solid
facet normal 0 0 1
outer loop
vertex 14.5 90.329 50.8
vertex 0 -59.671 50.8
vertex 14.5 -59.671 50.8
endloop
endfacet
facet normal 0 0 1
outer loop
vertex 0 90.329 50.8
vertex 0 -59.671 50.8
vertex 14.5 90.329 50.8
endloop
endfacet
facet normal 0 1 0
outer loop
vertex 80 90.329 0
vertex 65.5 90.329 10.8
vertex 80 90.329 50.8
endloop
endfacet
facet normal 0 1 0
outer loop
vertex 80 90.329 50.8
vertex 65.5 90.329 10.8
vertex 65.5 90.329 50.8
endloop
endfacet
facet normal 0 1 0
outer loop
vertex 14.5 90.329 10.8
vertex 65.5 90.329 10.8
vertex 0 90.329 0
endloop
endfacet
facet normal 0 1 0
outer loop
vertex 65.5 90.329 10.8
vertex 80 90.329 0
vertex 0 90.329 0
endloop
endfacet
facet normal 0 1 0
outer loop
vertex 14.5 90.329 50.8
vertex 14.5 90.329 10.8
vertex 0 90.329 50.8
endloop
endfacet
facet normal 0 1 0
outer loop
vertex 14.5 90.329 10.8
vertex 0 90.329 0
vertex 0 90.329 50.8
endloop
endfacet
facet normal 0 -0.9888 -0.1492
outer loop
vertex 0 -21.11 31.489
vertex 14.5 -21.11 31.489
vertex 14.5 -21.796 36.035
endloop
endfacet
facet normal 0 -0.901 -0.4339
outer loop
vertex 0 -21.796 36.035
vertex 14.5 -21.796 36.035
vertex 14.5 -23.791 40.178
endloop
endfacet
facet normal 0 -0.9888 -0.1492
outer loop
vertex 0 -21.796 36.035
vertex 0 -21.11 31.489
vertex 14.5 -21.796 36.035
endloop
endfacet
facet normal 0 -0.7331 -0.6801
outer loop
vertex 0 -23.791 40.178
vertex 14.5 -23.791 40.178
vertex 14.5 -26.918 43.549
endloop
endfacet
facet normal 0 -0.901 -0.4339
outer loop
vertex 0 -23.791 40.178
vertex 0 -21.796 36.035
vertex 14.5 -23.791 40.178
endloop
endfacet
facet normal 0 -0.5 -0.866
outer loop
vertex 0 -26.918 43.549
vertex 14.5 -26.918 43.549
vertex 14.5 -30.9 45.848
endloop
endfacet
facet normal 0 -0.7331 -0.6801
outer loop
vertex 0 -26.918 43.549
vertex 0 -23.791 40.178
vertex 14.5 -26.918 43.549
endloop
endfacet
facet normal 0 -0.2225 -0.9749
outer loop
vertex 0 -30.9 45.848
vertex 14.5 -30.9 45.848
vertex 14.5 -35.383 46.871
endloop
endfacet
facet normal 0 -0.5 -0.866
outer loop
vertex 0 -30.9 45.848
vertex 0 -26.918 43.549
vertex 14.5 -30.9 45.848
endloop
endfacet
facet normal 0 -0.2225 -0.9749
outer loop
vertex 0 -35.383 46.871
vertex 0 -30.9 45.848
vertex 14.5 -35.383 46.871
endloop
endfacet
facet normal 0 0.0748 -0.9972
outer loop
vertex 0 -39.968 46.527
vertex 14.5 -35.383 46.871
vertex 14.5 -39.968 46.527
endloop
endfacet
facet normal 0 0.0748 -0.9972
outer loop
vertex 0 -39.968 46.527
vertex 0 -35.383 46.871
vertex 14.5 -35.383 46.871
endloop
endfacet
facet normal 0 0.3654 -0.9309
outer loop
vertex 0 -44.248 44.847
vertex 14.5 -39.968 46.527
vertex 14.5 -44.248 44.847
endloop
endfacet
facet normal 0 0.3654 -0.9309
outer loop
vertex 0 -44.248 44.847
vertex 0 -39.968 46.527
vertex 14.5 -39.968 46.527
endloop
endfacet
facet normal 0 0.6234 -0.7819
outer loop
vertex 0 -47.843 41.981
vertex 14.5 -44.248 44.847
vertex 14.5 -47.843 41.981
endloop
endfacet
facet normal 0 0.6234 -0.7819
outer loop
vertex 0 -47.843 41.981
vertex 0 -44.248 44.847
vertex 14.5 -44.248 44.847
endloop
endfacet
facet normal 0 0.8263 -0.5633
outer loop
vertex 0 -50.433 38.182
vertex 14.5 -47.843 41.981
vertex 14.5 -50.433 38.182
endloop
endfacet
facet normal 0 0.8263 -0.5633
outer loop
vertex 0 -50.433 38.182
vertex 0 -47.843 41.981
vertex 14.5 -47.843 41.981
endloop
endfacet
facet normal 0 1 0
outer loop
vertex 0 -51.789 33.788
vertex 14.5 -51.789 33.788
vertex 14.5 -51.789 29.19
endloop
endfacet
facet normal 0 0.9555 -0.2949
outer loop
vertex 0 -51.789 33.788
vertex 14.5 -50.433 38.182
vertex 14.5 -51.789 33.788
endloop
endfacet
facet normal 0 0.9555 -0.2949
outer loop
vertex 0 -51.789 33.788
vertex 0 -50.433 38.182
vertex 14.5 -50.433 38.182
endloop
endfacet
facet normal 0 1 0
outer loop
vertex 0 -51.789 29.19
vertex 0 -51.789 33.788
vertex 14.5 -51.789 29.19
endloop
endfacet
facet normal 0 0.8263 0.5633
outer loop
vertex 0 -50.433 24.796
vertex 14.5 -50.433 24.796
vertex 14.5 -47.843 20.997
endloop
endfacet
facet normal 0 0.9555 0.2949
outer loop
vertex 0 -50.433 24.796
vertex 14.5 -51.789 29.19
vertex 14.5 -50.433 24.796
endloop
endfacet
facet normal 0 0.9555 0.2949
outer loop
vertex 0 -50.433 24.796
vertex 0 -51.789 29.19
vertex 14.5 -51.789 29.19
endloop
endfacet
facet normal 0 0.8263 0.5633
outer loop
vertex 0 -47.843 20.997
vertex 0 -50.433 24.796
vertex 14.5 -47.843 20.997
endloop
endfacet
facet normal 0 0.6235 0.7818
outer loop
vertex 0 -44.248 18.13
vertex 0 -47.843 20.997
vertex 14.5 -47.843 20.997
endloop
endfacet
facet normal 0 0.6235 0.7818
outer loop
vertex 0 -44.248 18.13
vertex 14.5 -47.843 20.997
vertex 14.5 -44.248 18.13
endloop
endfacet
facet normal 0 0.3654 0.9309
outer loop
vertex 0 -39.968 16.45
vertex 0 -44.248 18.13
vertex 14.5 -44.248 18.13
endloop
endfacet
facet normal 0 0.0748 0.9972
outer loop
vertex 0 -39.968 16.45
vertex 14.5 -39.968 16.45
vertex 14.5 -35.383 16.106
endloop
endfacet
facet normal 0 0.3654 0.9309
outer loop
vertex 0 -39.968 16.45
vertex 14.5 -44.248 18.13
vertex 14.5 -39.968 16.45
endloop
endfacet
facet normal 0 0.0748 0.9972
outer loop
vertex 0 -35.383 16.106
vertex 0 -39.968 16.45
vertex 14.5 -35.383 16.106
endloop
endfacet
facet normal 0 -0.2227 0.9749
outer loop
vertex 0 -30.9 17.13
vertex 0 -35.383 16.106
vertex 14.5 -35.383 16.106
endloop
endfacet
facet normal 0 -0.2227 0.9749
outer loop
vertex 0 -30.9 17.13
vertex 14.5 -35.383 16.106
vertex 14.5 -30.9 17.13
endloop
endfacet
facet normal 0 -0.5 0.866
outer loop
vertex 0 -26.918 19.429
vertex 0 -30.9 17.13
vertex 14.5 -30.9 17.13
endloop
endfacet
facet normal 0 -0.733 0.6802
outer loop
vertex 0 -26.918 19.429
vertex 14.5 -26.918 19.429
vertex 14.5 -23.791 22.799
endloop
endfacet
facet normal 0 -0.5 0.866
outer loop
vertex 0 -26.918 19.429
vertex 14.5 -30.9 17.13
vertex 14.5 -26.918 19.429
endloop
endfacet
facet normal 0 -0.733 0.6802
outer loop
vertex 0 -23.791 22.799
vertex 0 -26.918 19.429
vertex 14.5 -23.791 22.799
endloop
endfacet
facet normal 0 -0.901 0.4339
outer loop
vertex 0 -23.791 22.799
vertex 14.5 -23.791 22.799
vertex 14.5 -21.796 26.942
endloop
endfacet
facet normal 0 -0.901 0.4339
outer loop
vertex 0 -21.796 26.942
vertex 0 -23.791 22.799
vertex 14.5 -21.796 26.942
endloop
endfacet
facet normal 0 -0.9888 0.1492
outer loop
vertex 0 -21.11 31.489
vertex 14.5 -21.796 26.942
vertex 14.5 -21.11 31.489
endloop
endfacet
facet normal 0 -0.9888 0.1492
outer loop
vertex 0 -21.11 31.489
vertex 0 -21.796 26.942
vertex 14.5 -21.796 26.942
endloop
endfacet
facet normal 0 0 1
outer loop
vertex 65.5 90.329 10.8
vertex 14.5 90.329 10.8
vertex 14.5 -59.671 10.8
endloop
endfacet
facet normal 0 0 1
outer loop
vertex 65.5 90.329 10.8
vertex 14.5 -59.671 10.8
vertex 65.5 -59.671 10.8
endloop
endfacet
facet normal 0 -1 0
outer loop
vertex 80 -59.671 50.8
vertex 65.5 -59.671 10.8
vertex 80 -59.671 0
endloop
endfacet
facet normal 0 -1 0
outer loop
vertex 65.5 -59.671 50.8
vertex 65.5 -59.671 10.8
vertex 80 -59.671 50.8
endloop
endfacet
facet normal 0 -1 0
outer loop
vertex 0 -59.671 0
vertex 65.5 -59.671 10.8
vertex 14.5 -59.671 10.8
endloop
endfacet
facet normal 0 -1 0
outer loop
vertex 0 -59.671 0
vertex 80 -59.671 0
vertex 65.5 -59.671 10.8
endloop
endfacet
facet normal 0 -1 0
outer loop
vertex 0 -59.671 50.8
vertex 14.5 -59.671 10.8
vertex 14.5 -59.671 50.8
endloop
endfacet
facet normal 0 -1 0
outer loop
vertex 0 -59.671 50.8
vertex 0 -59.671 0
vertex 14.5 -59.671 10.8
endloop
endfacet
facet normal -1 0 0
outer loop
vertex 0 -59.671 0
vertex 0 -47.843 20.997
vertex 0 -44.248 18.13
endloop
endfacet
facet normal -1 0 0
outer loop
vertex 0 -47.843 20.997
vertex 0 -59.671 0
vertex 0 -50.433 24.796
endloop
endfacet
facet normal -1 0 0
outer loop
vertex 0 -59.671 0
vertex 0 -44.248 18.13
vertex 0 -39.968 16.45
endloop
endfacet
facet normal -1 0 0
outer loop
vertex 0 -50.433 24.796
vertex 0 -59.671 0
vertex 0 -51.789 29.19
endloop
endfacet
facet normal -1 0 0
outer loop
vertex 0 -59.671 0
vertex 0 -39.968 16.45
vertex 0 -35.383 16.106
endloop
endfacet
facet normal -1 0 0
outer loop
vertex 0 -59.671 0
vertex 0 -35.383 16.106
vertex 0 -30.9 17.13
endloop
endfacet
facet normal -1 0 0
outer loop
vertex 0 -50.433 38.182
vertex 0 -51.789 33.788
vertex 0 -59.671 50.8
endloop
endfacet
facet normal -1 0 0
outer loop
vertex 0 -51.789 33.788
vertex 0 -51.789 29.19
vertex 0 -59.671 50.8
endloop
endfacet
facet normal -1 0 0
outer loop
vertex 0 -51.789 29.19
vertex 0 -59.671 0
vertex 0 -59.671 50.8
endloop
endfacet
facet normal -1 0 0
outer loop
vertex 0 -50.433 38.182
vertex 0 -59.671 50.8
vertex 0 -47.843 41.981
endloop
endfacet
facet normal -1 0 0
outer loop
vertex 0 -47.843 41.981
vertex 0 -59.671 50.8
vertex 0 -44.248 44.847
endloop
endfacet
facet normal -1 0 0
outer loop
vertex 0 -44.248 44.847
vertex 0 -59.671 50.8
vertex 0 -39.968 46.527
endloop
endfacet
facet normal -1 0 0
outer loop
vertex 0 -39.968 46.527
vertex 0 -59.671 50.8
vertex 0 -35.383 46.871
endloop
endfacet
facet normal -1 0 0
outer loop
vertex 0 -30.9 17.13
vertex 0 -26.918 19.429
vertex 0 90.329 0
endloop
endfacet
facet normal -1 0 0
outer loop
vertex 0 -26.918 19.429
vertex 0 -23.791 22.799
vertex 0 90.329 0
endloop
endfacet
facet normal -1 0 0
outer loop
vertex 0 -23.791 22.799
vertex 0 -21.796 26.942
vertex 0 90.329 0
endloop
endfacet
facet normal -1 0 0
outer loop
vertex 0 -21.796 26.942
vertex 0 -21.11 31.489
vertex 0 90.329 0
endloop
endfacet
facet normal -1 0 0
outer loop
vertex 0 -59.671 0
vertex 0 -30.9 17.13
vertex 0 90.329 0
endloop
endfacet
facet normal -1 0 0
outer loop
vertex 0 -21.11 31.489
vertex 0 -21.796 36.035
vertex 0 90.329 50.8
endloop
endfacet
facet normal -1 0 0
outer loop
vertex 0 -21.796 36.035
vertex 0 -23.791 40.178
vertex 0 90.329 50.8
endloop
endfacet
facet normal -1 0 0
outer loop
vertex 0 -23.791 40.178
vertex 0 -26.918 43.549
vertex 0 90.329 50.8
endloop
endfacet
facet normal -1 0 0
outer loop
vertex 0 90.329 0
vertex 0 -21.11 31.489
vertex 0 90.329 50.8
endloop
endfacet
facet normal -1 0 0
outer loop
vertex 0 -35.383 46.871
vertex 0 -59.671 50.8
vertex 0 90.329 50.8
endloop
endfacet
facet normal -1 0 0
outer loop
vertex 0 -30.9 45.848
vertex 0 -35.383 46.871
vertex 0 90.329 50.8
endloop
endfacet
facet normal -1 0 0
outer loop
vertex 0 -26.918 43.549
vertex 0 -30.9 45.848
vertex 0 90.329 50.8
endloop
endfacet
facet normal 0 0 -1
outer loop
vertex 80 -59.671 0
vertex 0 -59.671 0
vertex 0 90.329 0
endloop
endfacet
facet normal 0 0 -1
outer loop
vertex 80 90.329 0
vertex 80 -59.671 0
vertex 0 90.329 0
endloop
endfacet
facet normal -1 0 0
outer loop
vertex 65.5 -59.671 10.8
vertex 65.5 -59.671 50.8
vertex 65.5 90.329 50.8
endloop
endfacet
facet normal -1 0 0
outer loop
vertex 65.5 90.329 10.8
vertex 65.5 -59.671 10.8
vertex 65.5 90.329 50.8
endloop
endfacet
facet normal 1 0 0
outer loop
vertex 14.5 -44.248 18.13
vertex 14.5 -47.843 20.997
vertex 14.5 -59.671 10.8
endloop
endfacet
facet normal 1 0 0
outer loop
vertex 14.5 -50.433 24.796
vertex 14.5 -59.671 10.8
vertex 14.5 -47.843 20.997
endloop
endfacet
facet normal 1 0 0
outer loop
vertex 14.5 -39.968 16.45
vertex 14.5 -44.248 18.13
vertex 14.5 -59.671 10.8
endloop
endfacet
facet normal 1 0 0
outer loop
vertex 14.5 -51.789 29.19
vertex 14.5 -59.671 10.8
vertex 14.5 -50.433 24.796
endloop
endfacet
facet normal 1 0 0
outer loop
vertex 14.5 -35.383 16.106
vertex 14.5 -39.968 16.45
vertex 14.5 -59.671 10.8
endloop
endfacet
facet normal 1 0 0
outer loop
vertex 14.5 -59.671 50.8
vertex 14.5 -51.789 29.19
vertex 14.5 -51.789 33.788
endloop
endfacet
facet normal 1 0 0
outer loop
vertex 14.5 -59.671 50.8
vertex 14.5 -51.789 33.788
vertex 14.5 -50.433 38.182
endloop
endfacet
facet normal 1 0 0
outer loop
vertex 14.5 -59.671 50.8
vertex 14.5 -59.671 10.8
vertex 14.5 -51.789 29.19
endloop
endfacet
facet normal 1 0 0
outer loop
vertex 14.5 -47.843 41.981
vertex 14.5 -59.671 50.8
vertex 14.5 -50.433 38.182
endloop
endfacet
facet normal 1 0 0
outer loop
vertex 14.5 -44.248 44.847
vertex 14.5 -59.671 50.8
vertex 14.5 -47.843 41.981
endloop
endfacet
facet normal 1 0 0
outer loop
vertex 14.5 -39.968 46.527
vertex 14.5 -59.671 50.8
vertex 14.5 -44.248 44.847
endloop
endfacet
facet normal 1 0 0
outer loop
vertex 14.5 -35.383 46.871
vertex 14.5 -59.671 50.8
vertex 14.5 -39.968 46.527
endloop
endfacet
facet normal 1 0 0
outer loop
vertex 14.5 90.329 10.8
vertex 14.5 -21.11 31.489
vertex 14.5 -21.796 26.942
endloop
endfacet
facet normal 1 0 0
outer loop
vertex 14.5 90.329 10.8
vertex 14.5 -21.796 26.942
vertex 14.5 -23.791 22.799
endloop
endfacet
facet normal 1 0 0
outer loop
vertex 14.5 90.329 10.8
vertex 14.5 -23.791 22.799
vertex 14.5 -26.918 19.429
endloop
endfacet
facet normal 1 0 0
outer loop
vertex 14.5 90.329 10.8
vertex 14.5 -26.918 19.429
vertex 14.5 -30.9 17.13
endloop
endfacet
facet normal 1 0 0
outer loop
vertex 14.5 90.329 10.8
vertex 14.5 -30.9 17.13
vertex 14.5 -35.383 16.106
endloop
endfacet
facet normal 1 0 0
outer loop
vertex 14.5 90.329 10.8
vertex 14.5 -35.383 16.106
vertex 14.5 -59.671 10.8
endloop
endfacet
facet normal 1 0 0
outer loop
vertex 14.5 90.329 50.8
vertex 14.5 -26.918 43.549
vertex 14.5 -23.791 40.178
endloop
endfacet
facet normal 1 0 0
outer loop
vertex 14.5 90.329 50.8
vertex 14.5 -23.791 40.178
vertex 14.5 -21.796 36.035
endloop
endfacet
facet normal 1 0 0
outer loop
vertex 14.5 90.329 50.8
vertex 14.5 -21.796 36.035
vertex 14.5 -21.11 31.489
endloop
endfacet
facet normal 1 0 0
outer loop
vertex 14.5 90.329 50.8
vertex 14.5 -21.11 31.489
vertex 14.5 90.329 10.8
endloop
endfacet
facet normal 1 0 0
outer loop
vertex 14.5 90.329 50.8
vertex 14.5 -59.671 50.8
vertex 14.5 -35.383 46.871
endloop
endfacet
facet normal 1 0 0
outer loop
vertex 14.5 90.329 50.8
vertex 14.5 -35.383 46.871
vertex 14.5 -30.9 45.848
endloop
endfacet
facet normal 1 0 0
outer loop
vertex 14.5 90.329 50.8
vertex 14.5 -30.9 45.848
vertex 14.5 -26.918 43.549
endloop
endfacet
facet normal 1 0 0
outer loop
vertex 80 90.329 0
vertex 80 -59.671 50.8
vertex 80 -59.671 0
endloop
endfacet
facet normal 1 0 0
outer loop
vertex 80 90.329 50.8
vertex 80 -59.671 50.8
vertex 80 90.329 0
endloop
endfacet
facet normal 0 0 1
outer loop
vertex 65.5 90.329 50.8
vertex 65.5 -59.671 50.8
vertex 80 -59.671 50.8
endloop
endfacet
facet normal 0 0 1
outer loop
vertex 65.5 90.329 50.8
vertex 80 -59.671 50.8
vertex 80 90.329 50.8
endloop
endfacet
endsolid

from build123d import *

# Parameters (mm, degrees)
F0_W     = 150
F0_H     = 50.8
F1_DEPTH = 80
F2_W     = 51
F2_H     = 150
F3_DEPTH = 40
F4_R     = 15.425374
F5_DEPTH = 25.4


with BuildPart() as f1:
    # F0 (on Right) → F1 (new body)
    with BuildSketch(Plane.YZ):
        with Locations((15.329447, 25.4)):
            Rectangle(F0_W, F0_H)
    extrude(amount=F1_DEPTH)

    # F2 (on face) → F3 (cut)
    with BuildSketch(Plane.XY.offset(50.8)):
        with Locations((40, 15.329447)):
            Rectangle(F2_W, F2_H)
    extrude(amount=-F3_DEPTH, mode=Mode.SUBTRACT)

    # F4 (on face) → F5 (cut)
    with BuildSketch(Plane.YZ):
        with Locations((-36.535583, 31.488702)):
            Circle(F4_R)
    extrude(amount=F5_DEPTH, mode=Mode.SUBTRACT)


solid = f1.part
